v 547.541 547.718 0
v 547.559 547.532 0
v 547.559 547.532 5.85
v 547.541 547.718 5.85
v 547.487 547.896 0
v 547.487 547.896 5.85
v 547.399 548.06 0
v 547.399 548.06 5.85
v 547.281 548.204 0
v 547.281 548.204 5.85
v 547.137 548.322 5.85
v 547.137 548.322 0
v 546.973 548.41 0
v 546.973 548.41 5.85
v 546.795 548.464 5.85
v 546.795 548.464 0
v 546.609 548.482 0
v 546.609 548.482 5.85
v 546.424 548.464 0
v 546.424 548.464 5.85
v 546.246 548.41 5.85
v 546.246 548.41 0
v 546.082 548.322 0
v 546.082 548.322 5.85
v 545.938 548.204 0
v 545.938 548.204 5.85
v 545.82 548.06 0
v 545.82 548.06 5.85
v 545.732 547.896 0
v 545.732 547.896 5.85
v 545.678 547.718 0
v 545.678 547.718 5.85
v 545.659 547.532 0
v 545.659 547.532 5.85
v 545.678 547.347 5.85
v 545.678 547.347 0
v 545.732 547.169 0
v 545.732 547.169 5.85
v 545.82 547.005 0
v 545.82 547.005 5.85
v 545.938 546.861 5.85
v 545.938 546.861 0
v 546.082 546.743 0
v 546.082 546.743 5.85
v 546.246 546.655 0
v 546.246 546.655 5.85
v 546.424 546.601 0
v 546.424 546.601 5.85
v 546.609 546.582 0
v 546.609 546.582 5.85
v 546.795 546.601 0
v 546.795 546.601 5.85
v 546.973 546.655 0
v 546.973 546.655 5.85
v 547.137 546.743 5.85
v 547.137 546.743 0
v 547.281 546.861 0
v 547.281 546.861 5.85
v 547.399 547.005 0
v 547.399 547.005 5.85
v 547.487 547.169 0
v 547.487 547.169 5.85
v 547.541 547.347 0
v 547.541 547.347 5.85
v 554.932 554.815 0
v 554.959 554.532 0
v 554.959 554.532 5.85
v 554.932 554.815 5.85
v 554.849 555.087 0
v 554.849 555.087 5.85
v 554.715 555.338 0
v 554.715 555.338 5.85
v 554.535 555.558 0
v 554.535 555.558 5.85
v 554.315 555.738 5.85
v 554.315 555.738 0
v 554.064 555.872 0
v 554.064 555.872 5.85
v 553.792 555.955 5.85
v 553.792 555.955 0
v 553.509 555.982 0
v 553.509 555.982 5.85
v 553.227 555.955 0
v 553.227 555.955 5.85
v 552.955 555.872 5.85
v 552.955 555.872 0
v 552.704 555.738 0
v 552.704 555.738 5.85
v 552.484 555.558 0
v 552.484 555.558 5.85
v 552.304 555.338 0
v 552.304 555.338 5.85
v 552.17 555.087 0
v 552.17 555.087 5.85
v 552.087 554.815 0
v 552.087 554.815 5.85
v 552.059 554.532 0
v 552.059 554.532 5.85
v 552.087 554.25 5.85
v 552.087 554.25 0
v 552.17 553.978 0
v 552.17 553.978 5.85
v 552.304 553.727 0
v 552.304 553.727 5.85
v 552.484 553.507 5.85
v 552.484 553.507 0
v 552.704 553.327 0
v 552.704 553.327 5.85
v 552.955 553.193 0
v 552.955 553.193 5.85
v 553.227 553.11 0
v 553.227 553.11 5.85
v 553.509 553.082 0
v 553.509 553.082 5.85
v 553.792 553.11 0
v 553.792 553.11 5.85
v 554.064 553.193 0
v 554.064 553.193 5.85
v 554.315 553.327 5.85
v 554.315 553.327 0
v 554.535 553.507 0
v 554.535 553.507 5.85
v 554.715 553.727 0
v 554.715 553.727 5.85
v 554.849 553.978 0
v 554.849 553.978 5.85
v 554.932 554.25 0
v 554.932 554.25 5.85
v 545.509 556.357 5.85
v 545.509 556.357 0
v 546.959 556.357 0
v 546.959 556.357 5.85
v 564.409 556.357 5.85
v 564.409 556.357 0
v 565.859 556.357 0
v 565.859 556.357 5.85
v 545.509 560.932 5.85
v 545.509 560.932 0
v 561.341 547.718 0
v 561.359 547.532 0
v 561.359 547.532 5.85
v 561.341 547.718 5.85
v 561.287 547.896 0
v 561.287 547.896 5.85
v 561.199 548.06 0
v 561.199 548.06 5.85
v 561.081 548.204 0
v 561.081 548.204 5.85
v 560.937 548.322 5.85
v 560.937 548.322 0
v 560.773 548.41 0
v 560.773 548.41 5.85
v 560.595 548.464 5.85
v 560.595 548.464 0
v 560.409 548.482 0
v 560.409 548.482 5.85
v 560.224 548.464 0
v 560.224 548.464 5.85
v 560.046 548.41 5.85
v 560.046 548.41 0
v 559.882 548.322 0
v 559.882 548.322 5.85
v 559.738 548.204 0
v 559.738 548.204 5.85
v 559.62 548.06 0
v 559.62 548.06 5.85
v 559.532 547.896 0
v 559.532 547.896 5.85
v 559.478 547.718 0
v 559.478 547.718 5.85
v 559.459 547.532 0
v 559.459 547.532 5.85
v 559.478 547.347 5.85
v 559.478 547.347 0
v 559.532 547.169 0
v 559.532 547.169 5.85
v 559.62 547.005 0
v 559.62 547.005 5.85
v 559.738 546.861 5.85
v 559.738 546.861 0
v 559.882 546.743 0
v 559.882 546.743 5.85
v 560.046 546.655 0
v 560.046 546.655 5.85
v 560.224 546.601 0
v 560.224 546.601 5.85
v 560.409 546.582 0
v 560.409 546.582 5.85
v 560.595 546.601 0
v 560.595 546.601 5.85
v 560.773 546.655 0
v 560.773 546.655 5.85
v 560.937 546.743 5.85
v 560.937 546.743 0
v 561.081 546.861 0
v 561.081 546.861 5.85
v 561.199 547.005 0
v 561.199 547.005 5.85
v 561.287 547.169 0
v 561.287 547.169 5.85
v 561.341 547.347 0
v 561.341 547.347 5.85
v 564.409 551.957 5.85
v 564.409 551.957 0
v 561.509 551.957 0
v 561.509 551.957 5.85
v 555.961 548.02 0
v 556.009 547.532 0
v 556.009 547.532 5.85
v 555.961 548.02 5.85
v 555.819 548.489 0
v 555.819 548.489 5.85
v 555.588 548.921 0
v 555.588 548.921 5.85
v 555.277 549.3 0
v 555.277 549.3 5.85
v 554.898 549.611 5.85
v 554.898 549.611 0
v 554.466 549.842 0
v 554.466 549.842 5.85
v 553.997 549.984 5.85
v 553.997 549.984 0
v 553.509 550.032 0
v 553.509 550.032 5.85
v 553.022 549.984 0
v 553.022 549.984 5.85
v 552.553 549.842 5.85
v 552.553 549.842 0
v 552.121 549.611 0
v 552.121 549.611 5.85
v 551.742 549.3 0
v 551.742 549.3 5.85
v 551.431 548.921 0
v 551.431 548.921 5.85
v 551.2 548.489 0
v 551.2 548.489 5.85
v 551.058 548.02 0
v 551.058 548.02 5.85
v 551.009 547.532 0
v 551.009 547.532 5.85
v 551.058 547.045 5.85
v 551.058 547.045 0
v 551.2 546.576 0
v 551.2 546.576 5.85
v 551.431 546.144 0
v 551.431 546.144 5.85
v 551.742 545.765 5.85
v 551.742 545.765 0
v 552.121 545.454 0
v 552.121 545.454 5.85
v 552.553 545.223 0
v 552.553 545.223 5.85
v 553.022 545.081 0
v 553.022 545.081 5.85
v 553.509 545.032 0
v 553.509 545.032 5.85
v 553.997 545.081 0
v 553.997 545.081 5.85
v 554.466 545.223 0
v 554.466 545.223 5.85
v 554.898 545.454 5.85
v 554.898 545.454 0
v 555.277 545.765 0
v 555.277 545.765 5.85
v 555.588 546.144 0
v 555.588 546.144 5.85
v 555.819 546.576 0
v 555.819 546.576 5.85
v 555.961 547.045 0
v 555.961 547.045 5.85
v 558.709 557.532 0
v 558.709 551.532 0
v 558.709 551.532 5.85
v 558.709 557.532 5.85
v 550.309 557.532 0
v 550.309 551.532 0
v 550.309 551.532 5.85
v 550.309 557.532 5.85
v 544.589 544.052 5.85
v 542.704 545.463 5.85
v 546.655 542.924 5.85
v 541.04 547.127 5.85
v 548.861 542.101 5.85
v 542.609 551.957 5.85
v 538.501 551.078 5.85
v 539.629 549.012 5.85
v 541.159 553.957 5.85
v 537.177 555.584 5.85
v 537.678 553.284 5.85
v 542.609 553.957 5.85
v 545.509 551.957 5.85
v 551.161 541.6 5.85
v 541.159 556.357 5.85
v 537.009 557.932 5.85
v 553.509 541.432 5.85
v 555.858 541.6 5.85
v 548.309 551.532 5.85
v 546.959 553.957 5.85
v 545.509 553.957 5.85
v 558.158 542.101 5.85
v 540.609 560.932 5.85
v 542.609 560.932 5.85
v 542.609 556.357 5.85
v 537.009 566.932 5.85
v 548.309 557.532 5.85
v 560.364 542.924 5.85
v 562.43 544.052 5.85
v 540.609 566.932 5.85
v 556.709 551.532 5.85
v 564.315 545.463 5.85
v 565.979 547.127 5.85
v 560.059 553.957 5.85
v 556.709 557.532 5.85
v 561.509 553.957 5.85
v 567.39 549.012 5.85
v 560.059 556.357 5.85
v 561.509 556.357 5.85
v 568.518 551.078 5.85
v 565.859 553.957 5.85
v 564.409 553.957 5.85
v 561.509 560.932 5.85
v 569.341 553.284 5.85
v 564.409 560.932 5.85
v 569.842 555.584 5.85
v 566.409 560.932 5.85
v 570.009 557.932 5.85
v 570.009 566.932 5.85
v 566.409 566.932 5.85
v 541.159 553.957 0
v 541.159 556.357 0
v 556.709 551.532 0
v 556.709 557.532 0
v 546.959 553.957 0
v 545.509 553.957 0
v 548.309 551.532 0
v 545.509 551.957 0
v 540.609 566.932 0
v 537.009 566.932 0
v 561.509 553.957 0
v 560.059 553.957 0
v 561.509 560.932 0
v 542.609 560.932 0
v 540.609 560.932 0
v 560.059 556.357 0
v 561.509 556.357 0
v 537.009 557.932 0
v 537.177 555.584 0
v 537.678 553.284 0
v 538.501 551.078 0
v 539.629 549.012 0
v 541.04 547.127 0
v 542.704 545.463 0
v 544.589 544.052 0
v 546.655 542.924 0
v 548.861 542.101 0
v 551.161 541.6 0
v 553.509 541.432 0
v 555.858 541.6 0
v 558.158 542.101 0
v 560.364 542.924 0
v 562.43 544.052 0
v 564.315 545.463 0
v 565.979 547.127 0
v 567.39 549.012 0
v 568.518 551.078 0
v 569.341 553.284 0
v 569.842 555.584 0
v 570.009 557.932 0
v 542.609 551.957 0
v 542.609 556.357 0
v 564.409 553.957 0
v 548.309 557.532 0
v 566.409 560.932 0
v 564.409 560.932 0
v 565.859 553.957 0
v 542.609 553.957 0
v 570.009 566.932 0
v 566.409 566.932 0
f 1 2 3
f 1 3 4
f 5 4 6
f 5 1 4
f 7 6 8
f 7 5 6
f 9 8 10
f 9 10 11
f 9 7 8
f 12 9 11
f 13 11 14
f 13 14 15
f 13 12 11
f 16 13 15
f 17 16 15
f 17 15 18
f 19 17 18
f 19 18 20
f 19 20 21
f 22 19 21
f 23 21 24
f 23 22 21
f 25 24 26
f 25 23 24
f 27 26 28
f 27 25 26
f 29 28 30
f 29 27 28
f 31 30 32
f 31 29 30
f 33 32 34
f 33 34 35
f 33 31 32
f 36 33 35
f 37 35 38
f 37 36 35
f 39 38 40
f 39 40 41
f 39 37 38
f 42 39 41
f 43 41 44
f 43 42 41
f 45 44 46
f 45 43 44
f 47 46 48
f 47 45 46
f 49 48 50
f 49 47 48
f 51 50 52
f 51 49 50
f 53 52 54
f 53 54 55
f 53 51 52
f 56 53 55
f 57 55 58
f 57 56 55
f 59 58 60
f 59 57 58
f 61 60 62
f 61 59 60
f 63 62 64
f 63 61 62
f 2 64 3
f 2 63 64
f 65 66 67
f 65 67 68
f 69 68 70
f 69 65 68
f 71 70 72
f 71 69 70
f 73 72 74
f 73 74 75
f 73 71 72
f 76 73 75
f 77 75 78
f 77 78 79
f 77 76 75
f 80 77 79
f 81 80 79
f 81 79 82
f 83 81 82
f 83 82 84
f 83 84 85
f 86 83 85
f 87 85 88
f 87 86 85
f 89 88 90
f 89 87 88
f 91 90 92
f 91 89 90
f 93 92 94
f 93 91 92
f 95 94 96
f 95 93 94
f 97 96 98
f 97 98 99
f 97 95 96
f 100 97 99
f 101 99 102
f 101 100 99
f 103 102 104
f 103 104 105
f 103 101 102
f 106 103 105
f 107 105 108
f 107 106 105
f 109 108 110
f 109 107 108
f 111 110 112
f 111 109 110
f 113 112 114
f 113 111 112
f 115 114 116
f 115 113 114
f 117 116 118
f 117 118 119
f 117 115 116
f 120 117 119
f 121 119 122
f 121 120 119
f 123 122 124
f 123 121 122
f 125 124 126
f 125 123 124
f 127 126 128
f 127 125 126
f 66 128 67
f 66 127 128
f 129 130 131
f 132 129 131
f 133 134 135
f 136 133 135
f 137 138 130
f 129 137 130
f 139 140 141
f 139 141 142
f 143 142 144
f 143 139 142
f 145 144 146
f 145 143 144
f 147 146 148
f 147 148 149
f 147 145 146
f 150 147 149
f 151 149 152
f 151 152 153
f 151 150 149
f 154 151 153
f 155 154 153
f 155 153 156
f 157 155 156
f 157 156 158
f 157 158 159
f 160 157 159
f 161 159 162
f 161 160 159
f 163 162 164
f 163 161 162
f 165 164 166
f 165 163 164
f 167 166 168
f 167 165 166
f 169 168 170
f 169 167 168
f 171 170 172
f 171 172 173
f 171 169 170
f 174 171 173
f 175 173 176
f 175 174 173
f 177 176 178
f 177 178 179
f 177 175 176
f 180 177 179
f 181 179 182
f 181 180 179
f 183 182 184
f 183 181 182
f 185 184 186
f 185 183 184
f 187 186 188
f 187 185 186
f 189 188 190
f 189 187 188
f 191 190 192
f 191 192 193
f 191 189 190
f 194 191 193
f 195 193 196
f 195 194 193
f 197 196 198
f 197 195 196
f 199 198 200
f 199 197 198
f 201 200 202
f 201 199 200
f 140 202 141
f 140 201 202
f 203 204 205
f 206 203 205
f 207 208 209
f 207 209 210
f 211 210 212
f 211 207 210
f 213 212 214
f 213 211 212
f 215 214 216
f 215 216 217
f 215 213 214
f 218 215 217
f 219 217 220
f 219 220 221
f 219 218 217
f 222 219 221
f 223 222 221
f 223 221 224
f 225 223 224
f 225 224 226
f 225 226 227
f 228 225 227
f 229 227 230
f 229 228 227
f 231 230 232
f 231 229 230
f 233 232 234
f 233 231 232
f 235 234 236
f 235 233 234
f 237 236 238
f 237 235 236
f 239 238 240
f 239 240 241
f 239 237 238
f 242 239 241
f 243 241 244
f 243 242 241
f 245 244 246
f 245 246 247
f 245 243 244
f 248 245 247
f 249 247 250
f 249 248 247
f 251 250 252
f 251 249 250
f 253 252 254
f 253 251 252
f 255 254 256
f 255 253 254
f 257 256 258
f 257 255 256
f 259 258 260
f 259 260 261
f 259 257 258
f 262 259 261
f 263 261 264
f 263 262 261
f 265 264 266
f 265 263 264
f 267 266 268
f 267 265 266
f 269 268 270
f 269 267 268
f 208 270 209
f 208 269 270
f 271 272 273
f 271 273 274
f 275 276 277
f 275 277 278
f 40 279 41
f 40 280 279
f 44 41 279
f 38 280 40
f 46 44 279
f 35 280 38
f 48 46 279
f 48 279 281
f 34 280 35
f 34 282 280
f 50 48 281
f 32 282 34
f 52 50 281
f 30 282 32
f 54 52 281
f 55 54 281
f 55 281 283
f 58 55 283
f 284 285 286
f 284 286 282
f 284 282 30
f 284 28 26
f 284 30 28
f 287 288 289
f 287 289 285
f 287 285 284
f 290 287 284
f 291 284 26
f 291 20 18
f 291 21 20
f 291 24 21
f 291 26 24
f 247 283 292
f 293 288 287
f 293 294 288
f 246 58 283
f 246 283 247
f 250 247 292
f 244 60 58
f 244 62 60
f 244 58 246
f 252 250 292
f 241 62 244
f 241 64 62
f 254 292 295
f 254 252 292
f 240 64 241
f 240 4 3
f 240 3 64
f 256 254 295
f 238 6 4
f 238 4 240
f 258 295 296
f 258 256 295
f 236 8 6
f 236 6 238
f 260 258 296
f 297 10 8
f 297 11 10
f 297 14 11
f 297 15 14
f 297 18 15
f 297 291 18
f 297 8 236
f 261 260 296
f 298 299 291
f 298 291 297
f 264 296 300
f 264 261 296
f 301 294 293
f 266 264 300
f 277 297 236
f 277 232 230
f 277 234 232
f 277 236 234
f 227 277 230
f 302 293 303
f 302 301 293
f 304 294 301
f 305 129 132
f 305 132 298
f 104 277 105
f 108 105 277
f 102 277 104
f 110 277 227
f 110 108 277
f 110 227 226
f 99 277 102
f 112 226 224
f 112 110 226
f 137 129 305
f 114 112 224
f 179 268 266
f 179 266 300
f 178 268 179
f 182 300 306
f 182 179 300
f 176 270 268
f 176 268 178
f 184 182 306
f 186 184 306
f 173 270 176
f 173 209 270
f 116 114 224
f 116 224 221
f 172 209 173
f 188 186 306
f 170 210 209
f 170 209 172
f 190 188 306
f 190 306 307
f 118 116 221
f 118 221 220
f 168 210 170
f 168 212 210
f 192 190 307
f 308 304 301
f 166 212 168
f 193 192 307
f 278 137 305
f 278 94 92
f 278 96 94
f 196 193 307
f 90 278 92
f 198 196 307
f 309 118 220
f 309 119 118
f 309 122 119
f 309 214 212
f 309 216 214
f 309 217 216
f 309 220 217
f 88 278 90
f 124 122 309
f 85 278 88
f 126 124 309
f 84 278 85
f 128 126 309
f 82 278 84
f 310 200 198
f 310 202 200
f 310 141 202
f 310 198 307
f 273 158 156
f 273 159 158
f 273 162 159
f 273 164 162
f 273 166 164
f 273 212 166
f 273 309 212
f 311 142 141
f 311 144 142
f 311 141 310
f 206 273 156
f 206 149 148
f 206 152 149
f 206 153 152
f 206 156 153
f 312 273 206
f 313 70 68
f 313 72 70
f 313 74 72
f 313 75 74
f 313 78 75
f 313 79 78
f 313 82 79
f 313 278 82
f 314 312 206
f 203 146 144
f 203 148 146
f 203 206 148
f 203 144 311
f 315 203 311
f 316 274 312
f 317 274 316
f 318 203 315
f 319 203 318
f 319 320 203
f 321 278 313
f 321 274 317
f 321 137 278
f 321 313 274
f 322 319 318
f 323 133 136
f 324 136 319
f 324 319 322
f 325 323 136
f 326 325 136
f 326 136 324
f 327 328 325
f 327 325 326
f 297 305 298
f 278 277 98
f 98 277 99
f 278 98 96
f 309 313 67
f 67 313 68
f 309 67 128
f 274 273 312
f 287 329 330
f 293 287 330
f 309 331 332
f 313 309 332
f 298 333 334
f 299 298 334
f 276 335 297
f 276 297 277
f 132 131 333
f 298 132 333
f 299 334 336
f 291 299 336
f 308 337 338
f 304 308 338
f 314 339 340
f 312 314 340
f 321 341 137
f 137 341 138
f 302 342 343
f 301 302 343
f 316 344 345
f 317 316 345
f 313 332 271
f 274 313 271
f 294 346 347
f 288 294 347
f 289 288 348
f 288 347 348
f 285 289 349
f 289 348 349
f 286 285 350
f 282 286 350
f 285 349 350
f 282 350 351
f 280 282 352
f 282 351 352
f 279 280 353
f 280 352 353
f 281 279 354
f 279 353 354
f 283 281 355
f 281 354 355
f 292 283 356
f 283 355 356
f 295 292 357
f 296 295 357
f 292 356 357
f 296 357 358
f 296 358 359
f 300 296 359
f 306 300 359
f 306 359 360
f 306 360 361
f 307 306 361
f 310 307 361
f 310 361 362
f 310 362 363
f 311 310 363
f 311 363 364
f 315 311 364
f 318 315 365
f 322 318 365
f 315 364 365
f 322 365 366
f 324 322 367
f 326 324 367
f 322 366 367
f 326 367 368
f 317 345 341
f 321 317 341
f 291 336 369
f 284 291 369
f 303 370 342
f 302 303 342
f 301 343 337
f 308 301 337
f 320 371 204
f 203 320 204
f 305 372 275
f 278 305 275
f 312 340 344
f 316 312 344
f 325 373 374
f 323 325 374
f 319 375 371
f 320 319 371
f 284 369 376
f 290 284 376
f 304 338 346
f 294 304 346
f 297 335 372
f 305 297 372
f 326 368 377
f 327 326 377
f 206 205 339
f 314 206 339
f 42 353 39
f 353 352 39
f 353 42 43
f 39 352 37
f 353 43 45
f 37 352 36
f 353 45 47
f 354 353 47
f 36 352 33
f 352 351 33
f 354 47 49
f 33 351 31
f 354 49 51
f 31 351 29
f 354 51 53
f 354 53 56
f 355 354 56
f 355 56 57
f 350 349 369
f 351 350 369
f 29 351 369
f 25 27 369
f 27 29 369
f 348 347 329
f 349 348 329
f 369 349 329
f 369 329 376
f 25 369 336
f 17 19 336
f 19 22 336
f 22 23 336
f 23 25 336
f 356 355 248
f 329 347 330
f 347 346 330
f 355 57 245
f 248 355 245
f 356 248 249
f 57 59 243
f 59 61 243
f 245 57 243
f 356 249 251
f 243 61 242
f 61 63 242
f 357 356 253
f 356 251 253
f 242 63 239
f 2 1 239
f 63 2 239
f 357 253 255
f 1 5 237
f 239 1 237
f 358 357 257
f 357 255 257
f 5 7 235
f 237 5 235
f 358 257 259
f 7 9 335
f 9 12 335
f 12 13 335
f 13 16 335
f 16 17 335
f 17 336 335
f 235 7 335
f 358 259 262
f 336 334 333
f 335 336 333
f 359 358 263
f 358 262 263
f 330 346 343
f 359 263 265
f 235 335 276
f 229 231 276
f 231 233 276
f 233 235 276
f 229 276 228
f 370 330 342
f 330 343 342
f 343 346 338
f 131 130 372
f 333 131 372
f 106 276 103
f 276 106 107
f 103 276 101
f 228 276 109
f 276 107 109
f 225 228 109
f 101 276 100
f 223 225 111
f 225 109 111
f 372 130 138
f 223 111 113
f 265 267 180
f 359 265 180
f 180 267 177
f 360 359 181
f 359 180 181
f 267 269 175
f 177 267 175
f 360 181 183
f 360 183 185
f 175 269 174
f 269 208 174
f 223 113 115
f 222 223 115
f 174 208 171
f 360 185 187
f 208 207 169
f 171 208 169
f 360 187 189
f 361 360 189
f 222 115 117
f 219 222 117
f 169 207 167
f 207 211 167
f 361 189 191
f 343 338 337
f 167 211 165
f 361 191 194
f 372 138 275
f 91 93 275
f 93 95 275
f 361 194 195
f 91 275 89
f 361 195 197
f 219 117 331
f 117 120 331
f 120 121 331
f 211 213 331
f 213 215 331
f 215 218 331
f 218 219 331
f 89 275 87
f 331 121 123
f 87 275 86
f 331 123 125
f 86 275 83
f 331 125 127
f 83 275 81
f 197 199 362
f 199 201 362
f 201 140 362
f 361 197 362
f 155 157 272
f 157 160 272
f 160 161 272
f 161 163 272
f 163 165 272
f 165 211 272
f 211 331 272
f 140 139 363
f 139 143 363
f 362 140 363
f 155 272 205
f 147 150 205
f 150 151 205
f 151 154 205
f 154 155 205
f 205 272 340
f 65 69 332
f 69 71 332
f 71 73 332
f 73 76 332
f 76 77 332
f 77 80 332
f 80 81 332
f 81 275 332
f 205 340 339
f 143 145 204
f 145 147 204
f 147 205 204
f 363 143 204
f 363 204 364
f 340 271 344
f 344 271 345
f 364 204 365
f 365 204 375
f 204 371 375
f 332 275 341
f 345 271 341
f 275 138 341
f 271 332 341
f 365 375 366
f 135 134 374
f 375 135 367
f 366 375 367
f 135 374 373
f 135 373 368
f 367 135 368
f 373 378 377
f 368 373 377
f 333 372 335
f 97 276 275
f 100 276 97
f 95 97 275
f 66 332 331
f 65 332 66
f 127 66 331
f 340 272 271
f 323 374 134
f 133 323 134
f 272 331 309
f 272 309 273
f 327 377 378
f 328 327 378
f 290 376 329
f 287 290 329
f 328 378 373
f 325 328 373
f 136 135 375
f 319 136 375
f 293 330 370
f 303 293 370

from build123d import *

# Parameters (mm, degrees)
MODEL_R             = 0.95
MODEL_R_2           = 2.5
MODEL_W             = 2
MODEL_H             = 6
MODEL_R_3           = 1.45
BOSS_EXTRUDE2_DEPTH = 5.85


with BuildPart() as part:
    # Model → Boss-Extrude2 (new body)
    with BuildSketch(Plane.XY):
        with BuildLine():
            Line((553.509477136, 560.932469), (545.509477136, 560.932469))
            Line((545.509477136, 560.932469), (545.509477136, 556.356563))
            Line((545.509477136, 556.356563), (546.959477136, 556.356563))
            Line((546.959477136, 556.356563), (546.959477136, 553.956511944))
            Line((546.959477136, 553.956511944), (545.509477136, 553.956511944))
            Line((545.509477136, 553.956511944), (545.509477136, 551.956511944))
            Line((545.509477136, 551.956511944), (542.609477136, 551.956511944))
            Line((542.609477136, 551.956511944), (542.609477136, 553.956511944))
            Line((542.609477136, 553.956511944), (541.159477136, 553.956511944))
            Line((541.159477136, 553.956511944), (541.159477136, 556.356563))
            Line((541.159477136, 556.356563), (542.609477136, 556.356563))
            Line((542.609477136, 556.356563), (542.609477136, 560.932469))
            Line((542.609477136, 560.932469), (540.609477136, 560.932469))
            Line((540.609477136, 560.932469), (540.609477136, 566.932469))
            Line((540.609477136, 566.932469), (537.009477136, 566.932469))
            Line((537.009477136, 566.932469), (537.009477136, 557.932469))
            ThreePointArc((537.009477136, 557.932469), (553.509477136, 541.432469), (570.009477136, 557.932469))
            Line((570.009477136, 557.932469), (570.009477136, 566.932469))
            Line((570.009477136, 566.932469), (566.409477136, 566.932469))
            Line((566.409477136, 566.932469), (566.409477136, 560.932469))
            Line((566.409477136, 560.932469), (564.409477136, 560.932469))
            Line((564.409477136, 560.932469), (564.409477136, 556.356563))
            Line((564.409477136, 556.356563), (565.859477136, 556.356563))
            Line((565.859477136, 556.356563), (565.859477136, 553.956511944))
            Line((565.859477136, 553.956511944), (564.409477136, 553.956511944))
            Line((564.409477136, 553.956511944), (564.409477136, 551.956511944))
            Line((564.409477136, 551.956511944), (561.509477136, 551.956511944))
            Line((561.509477136, 551.956511944), (561.509477136, 553.956511944))
            Line((561.509477136, 553.956511944), (560.059477136, 553.956511944))
            Line((560.059477136, 553.956511944), (560.059477136, 556.356563))
            Line((560.059477136, 556.356563), (561.509477136, 556.356563))
            Line((561.509477136, 556.356563), (561.509477136, 560.932469))
            Line((561.509477136, 560.932469), (553.509477136, 560.932469))
        make_face()
        with Locations((546.609477136, 547.532469)):
            Circle(MODEL_R, mode=Mode.SUBTRACT)
        with Locations((553.509477136, 547.532469)):
            Circle(MODEL_R_2, mode=Mode.SUBTRACT)
        with Locations((560.409477136, 547.532469)):
            Circle(MODEL_R, mode=Mode.SUBTRACT)
        with Locations((549.309477136, 554.532469)):
            Rectangle(MODEL_W, MODEL_H, mode=Mode.SUBTRACT)
        with Locations((553.509477136, 554.532469)):
            Circle(MODEL_R_3, mode=Mode.SUBTRACT)
        with Locations((557.709477136, 554.532469)):
            Rectangle(MODEL_W, MODEL_H, mode=Mode.SUBTRACT)
    extrude(amount=BOSS_EXTRUDE2_DEPTH)


solid = part.part
